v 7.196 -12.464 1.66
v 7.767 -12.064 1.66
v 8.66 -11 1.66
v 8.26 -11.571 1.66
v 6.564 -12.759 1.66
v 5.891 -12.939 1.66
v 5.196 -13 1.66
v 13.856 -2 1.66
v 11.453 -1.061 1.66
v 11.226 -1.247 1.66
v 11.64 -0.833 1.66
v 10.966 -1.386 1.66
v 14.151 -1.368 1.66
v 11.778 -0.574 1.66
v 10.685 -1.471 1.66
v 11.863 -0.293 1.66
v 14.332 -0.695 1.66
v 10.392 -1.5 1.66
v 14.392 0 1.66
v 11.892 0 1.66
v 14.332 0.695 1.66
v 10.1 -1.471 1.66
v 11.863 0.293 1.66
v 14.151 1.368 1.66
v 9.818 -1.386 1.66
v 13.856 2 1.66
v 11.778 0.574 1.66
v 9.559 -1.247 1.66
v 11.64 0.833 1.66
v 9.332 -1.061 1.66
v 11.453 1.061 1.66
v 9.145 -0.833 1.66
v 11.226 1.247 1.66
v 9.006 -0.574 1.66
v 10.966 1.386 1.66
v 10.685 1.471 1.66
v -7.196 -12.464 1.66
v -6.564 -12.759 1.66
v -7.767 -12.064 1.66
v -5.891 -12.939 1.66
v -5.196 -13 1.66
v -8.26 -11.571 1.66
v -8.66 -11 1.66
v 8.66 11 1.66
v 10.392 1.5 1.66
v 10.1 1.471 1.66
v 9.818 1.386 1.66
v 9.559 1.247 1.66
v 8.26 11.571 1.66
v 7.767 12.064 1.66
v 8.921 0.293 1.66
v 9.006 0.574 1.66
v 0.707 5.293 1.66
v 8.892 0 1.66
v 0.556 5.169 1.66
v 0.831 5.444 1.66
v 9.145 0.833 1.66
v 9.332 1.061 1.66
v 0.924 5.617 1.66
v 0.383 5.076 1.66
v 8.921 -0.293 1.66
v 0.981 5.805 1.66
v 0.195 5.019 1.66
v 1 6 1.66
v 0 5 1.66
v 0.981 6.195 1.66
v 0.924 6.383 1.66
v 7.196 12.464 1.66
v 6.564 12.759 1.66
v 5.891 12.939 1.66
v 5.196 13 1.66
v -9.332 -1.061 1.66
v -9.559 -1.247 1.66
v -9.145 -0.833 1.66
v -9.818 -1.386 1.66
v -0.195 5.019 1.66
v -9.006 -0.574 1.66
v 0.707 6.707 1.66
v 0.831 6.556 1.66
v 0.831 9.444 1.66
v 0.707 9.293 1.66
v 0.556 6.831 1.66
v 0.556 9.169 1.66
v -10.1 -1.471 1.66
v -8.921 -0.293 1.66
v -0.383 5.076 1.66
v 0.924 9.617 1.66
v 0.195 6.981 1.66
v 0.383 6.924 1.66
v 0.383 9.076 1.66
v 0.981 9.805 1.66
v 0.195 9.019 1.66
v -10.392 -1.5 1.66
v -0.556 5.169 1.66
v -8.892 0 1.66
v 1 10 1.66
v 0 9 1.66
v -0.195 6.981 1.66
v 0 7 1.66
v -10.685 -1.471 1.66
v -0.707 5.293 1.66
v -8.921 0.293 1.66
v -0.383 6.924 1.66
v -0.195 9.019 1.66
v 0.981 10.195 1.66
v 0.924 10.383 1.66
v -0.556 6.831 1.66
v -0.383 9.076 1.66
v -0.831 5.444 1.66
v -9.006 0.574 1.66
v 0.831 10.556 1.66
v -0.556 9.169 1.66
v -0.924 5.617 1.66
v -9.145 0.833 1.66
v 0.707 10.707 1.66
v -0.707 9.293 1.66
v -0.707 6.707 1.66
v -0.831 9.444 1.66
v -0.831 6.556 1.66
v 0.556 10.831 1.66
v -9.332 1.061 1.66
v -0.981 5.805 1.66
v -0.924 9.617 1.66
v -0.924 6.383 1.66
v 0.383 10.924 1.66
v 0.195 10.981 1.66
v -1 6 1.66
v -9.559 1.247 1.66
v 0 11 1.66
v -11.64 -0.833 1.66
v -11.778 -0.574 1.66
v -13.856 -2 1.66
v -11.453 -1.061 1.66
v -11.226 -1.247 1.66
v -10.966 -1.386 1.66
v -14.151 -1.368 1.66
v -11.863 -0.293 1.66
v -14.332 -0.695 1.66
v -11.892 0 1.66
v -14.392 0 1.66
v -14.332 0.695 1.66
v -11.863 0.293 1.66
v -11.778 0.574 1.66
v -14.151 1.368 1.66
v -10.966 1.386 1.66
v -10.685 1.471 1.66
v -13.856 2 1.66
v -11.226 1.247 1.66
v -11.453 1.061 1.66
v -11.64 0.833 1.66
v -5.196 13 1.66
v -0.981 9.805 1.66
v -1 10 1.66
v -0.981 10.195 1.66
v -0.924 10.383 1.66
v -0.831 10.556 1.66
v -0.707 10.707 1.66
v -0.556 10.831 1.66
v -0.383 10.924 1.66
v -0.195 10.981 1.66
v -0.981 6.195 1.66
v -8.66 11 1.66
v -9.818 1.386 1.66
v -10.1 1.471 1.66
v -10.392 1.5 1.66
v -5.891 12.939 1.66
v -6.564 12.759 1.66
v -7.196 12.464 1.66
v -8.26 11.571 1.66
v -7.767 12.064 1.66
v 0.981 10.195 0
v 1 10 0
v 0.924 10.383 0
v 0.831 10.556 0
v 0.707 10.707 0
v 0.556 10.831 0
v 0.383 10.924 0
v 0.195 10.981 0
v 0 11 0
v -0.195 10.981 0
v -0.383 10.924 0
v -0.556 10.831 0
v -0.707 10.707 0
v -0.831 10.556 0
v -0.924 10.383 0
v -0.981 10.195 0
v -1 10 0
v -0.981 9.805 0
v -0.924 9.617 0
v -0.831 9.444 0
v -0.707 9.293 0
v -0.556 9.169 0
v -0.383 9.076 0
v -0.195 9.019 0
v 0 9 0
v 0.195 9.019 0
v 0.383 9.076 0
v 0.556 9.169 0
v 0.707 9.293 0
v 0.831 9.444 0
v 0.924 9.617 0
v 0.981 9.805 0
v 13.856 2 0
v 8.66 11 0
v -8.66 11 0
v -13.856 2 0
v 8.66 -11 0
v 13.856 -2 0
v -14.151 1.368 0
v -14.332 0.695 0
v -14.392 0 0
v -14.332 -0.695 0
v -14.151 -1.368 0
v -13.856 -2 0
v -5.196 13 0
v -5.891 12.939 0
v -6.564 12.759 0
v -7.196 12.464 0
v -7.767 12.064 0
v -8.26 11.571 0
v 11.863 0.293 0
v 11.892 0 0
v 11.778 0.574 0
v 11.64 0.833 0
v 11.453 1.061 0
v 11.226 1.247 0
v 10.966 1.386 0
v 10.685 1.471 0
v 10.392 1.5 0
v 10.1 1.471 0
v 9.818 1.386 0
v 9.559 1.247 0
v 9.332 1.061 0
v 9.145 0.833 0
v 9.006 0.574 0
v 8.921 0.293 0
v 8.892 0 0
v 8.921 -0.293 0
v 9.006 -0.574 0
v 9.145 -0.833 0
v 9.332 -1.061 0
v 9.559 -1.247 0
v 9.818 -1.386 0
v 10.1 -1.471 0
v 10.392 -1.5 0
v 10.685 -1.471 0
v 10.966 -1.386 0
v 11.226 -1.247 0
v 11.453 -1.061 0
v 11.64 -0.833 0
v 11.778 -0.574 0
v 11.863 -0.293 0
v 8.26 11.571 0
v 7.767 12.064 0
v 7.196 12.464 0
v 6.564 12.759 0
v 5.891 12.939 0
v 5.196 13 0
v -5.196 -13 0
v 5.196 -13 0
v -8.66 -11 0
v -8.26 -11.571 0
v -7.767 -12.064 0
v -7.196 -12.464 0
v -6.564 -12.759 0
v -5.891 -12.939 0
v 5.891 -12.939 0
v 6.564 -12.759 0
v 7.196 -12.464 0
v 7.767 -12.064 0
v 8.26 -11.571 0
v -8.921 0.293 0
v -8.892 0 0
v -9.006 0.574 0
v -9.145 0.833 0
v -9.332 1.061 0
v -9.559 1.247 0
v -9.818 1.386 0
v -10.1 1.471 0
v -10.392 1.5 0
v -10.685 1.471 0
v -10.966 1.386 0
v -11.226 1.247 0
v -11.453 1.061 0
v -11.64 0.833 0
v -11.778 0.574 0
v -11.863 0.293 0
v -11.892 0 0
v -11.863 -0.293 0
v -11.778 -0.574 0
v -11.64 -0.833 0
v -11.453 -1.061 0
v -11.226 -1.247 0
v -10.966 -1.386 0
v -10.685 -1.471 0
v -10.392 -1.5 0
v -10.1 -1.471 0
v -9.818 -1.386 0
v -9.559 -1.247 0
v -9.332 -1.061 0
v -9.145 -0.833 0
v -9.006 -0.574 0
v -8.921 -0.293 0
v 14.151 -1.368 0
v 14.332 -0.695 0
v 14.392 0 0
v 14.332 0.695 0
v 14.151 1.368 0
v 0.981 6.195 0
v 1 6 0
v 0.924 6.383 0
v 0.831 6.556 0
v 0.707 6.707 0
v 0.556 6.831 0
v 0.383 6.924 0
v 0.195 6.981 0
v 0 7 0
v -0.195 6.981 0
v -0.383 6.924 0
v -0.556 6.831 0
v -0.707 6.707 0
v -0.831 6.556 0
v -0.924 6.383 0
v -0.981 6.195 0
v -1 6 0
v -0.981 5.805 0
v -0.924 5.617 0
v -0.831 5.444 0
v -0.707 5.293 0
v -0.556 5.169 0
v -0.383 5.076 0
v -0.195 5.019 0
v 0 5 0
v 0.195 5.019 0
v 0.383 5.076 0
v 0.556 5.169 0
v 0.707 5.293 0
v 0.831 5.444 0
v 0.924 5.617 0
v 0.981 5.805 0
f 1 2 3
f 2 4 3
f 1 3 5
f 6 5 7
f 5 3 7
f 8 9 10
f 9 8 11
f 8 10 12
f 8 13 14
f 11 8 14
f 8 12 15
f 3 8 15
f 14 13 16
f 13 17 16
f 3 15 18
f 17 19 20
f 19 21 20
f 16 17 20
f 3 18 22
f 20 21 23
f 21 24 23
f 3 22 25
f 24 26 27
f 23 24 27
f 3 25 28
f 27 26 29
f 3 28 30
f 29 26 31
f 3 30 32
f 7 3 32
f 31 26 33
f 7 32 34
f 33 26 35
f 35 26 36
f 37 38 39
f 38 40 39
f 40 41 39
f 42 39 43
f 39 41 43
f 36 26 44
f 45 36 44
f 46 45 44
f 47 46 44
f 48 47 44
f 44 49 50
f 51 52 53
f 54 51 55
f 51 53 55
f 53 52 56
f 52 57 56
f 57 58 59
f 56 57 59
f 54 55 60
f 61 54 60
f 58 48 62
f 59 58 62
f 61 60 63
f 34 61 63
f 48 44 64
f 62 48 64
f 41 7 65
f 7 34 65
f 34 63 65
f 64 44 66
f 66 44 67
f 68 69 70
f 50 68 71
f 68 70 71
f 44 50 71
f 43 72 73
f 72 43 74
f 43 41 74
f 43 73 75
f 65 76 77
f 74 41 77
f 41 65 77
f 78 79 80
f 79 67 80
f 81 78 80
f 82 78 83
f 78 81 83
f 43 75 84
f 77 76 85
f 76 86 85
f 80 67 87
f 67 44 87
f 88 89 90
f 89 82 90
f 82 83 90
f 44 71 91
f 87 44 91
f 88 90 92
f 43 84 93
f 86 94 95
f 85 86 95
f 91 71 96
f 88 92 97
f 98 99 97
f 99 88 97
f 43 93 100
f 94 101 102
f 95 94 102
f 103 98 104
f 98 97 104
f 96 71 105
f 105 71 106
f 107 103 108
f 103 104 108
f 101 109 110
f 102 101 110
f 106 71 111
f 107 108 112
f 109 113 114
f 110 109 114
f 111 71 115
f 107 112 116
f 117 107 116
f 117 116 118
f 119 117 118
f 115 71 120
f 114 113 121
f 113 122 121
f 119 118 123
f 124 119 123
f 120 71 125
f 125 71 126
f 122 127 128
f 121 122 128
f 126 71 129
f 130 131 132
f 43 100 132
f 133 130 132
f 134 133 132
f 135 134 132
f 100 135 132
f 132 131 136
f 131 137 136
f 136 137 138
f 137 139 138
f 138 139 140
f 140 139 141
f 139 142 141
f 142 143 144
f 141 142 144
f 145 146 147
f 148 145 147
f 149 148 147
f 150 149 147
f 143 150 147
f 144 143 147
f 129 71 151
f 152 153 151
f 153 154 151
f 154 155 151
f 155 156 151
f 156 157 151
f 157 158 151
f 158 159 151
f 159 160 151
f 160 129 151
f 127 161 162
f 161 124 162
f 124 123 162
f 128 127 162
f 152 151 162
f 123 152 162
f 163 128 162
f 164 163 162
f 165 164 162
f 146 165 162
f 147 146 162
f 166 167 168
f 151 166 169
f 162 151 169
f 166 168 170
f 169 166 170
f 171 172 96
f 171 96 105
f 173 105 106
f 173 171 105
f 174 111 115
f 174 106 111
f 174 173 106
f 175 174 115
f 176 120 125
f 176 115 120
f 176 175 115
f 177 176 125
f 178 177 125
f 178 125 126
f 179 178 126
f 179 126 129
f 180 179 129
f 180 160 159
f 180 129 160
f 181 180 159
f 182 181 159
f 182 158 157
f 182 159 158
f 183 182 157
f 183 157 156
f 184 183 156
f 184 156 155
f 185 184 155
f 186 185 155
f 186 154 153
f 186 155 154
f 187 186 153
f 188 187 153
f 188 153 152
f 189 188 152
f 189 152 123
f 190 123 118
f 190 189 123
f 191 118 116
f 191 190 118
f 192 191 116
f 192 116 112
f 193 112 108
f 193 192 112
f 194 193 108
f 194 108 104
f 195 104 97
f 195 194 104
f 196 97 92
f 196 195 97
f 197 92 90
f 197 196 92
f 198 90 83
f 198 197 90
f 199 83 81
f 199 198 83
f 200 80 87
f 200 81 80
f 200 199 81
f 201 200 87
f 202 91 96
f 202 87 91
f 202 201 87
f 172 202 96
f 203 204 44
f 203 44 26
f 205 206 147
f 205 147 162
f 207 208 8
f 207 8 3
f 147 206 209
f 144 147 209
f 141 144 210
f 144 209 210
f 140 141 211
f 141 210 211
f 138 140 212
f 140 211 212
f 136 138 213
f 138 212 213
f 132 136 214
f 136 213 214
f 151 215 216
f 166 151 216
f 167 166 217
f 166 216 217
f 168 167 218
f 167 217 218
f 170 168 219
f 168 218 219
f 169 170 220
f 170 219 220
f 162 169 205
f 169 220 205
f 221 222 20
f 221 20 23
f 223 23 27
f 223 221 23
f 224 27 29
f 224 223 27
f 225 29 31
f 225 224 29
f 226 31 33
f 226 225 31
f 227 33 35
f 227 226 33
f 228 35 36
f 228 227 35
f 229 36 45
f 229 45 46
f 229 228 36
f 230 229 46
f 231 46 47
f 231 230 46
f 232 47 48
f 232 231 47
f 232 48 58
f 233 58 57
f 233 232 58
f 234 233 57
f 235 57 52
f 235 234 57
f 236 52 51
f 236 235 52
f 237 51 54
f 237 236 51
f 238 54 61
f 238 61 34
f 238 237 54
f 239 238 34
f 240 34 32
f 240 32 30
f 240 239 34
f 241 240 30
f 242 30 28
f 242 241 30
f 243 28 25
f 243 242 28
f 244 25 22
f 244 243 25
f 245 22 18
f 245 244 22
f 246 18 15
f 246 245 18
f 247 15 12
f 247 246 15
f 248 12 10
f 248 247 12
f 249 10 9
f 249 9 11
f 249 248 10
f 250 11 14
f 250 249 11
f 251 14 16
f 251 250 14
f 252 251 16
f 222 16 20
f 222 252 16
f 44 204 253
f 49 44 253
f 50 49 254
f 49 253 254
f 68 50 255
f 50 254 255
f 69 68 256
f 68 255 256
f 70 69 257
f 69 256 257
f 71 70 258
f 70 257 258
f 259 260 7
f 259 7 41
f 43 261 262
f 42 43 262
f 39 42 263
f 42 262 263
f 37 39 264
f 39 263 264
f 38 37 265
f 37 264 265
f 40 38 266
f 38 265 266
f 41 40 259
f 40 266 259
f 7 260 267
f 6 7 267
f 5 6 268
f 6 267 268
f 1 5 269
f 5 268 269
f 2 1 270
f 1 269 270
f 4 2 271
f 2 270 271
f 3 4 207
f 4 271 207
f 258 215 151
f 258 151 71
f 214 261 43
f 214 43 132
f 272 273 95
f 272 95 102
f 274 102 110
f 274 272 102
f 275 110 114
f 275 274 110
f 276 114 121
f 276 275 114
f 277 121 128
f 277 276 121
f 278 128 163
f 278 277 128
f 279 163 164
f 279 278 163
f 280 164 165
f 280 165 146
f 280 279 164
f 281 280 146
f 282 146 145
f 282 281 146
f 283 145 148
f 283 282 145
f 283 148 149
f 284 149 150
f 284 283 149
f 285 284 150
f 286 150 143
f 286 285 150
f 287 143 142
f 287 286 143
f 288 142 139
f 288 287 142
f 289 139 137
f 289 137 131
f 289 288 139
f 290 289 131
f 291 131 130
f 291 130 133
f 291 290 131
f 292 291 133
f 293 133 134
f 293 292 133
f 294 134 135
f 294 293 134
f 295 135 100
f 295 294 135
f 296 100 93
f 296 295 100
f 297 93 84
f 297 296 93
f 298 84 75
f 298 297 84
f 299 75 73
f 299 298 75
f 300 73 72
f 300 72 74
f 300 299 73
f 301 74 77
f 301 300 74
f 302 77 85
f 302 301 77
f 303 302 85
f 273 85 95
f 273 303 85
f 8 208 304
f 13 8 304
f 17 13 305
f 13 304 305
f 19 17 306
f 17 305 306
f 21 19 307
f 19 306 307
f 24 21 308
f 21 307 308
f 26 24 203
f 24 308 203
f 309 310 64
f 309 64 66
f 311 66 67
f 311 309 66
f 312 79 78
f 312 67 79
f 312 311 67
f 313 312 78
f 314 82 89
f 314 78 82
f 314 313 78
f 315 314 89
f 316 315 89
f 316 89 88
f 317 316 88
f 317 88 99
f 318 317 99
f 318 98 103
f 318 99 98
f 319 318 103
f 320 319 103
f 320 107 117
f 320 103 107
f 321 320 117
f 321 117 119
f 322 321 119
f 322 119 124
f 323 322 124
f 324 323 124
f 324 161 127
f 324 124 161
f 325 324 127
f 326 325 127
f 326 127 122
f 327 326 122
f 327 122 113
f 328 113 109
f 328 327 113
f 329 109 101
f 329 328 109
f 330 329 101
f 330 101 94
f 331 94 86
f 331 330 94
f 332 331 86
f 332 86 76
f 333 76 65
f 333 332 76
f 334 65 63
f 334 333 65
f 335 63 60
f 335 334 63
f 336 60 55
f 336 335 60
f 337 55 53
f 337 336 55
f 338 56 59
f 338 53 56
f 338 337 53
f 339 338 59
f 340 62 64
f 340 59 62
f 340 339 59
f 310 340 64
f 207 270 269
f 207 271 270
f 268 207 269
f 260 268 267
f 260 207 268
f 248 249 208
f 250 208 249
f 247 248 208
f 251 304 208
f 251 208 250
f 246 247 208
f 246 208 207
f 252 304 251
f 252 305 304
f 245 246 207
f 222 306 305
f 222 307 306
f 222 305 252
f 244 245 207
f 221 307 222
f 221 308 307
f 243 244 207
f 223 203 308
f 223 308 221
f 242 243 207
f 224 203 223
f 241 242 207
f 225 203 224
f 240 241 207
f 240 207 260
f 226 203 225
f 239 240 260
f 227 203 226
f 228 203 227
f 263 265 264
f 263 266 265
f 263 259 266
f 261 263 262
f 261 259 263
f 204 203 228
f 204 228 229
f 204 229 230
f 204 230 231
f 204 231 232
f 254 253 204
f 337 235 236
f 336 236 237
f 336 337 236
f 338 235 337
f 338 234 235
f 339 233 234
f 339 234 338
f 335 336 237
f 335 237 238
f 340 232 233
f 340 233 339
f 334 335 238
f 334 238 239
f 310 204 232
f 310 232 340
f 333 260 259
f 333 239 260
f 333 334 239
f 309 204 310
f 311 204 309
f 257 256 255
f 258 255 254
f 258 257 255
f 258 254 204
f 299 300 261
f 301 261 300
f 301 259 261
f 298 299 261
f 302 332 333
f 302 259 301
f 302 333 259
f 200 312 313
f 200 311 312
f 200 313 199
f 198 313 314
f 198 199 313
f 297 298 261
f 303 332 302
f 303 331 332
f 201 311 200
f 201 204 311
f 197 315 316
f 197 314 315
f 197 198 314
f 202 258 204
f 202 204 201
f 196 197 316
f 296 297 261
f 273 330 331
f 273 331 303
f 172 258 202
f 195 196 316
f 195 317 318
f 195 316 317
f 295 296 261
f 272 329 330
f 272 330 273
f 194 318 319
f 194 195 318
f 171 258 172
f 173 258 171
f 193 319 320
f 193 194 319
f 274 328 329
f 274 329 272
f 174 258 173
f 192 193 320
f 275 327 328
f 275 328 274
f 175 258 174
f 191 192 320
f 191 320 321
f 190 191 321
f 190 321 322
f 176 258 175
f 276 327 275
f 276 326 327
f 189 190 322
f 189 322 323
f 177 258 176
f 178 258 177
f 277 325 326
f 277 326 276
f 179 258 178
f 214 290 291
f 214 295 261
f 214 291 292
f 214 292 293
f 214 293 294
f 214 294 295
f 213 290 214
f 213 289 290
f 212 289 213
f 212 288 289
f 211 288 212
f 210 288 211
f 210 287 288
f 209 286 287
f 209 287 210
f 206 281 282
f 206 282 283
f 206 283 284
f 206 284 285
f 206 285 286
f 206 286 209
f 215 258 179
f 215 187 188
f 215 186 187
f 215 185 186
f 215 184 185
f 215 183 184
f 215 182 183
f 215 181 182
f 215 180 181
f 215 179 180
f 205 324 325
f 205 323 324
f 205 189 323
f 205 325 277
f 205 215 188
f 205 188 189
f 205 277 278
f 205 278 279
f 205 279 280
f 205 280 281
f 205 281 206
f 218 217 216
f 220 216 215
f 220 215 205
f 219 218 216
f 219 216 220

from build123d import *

# Parameters (mm, degrees)
CYLINDER001_R     = 1
CYLINDER001_DEPTH = 10
CYLINDER_R        = 1
CYLINDER_DEPTH    = 10
SKETCH_R          = 1.5
PAD_DEPTH         = 1.66


with BuildPart() as cilindro001:
    # Cylinder001 → Cylinder001 (new body)
    with BuildSketch(Plane(origin=(0, 6, -2), x_dir=(1, 0, 0), z_dir=(0, 0, 1))):
        Circle(CYLINDER001_R)
    extrude(amount=CYLINDER001_DEPTH)


with BuildPart() as cilindro:
    # Cylinder → Cylinder (new body)
    with BuildSketch(Plane(origin=(0, 10, -2), x_dir=(1, 0, 0), z_dir=(0, 0, 1))):
        Circle(CYLINDER_R)
    extrude(amount=CYLINDER_DEPTH)


with BuildPart() as placa_zumsingle:
    # Sketch → Pad (new body)
    with BuildSketch(Plane.XY):
        with BuildLine():
            Line((-13.856406, 2), (-8.660254, 11))
            ThreePointArc((-5.196152, 13), (-7.196152, 12.464102), (-8.660254, 11))
            Line((-5.196152, 13), (5.196152, 13))
            ThreePointArc((8.660254, 11), (7.196152, 12.464102), (5.196152, 13))
            Line((8.660254, 11), (13.856406, 2))
            ThreePointArc((13.856406, -2), (14.392305, 0), (13.856406, 2))
            Line((13.856406, -2), (8.660254, -11))
            ThreePointArc((5.196152, -13), (7.196152, -12.464102), (8.660254, -11))
            Line((5.196152, -13), (-5.196152, -13))
            ThreePointArc((-8.660254, -11), (-7.196152, -12.464102), (-5.196152, -13))
            Line((-8.660254, -11), (-13.856406, -2))
            ThreePointArc((-13.856406, 2), (-14.392305, 0), (-13.856406, -2))
        make_face()
        with Locations((-10.392305, 0)):
            Circle(SKETCH_R, mode=Mode.SUBTRACT)
        with Locations((10.392305, 0)):
            Circle(SKETCH_R, mode=Mode.SUBTRACT)
    extrude(amount=PAD_DEPTH)

    # Cut003: cut Cilindro
    add(cilindro.part, mode=Mode.SUBTRACT)

    # Cut004: cut Cilindro001
    add(cilindro001.part, mode=Mode.SUBTRACT)


solid = placa_zumsingle.part
